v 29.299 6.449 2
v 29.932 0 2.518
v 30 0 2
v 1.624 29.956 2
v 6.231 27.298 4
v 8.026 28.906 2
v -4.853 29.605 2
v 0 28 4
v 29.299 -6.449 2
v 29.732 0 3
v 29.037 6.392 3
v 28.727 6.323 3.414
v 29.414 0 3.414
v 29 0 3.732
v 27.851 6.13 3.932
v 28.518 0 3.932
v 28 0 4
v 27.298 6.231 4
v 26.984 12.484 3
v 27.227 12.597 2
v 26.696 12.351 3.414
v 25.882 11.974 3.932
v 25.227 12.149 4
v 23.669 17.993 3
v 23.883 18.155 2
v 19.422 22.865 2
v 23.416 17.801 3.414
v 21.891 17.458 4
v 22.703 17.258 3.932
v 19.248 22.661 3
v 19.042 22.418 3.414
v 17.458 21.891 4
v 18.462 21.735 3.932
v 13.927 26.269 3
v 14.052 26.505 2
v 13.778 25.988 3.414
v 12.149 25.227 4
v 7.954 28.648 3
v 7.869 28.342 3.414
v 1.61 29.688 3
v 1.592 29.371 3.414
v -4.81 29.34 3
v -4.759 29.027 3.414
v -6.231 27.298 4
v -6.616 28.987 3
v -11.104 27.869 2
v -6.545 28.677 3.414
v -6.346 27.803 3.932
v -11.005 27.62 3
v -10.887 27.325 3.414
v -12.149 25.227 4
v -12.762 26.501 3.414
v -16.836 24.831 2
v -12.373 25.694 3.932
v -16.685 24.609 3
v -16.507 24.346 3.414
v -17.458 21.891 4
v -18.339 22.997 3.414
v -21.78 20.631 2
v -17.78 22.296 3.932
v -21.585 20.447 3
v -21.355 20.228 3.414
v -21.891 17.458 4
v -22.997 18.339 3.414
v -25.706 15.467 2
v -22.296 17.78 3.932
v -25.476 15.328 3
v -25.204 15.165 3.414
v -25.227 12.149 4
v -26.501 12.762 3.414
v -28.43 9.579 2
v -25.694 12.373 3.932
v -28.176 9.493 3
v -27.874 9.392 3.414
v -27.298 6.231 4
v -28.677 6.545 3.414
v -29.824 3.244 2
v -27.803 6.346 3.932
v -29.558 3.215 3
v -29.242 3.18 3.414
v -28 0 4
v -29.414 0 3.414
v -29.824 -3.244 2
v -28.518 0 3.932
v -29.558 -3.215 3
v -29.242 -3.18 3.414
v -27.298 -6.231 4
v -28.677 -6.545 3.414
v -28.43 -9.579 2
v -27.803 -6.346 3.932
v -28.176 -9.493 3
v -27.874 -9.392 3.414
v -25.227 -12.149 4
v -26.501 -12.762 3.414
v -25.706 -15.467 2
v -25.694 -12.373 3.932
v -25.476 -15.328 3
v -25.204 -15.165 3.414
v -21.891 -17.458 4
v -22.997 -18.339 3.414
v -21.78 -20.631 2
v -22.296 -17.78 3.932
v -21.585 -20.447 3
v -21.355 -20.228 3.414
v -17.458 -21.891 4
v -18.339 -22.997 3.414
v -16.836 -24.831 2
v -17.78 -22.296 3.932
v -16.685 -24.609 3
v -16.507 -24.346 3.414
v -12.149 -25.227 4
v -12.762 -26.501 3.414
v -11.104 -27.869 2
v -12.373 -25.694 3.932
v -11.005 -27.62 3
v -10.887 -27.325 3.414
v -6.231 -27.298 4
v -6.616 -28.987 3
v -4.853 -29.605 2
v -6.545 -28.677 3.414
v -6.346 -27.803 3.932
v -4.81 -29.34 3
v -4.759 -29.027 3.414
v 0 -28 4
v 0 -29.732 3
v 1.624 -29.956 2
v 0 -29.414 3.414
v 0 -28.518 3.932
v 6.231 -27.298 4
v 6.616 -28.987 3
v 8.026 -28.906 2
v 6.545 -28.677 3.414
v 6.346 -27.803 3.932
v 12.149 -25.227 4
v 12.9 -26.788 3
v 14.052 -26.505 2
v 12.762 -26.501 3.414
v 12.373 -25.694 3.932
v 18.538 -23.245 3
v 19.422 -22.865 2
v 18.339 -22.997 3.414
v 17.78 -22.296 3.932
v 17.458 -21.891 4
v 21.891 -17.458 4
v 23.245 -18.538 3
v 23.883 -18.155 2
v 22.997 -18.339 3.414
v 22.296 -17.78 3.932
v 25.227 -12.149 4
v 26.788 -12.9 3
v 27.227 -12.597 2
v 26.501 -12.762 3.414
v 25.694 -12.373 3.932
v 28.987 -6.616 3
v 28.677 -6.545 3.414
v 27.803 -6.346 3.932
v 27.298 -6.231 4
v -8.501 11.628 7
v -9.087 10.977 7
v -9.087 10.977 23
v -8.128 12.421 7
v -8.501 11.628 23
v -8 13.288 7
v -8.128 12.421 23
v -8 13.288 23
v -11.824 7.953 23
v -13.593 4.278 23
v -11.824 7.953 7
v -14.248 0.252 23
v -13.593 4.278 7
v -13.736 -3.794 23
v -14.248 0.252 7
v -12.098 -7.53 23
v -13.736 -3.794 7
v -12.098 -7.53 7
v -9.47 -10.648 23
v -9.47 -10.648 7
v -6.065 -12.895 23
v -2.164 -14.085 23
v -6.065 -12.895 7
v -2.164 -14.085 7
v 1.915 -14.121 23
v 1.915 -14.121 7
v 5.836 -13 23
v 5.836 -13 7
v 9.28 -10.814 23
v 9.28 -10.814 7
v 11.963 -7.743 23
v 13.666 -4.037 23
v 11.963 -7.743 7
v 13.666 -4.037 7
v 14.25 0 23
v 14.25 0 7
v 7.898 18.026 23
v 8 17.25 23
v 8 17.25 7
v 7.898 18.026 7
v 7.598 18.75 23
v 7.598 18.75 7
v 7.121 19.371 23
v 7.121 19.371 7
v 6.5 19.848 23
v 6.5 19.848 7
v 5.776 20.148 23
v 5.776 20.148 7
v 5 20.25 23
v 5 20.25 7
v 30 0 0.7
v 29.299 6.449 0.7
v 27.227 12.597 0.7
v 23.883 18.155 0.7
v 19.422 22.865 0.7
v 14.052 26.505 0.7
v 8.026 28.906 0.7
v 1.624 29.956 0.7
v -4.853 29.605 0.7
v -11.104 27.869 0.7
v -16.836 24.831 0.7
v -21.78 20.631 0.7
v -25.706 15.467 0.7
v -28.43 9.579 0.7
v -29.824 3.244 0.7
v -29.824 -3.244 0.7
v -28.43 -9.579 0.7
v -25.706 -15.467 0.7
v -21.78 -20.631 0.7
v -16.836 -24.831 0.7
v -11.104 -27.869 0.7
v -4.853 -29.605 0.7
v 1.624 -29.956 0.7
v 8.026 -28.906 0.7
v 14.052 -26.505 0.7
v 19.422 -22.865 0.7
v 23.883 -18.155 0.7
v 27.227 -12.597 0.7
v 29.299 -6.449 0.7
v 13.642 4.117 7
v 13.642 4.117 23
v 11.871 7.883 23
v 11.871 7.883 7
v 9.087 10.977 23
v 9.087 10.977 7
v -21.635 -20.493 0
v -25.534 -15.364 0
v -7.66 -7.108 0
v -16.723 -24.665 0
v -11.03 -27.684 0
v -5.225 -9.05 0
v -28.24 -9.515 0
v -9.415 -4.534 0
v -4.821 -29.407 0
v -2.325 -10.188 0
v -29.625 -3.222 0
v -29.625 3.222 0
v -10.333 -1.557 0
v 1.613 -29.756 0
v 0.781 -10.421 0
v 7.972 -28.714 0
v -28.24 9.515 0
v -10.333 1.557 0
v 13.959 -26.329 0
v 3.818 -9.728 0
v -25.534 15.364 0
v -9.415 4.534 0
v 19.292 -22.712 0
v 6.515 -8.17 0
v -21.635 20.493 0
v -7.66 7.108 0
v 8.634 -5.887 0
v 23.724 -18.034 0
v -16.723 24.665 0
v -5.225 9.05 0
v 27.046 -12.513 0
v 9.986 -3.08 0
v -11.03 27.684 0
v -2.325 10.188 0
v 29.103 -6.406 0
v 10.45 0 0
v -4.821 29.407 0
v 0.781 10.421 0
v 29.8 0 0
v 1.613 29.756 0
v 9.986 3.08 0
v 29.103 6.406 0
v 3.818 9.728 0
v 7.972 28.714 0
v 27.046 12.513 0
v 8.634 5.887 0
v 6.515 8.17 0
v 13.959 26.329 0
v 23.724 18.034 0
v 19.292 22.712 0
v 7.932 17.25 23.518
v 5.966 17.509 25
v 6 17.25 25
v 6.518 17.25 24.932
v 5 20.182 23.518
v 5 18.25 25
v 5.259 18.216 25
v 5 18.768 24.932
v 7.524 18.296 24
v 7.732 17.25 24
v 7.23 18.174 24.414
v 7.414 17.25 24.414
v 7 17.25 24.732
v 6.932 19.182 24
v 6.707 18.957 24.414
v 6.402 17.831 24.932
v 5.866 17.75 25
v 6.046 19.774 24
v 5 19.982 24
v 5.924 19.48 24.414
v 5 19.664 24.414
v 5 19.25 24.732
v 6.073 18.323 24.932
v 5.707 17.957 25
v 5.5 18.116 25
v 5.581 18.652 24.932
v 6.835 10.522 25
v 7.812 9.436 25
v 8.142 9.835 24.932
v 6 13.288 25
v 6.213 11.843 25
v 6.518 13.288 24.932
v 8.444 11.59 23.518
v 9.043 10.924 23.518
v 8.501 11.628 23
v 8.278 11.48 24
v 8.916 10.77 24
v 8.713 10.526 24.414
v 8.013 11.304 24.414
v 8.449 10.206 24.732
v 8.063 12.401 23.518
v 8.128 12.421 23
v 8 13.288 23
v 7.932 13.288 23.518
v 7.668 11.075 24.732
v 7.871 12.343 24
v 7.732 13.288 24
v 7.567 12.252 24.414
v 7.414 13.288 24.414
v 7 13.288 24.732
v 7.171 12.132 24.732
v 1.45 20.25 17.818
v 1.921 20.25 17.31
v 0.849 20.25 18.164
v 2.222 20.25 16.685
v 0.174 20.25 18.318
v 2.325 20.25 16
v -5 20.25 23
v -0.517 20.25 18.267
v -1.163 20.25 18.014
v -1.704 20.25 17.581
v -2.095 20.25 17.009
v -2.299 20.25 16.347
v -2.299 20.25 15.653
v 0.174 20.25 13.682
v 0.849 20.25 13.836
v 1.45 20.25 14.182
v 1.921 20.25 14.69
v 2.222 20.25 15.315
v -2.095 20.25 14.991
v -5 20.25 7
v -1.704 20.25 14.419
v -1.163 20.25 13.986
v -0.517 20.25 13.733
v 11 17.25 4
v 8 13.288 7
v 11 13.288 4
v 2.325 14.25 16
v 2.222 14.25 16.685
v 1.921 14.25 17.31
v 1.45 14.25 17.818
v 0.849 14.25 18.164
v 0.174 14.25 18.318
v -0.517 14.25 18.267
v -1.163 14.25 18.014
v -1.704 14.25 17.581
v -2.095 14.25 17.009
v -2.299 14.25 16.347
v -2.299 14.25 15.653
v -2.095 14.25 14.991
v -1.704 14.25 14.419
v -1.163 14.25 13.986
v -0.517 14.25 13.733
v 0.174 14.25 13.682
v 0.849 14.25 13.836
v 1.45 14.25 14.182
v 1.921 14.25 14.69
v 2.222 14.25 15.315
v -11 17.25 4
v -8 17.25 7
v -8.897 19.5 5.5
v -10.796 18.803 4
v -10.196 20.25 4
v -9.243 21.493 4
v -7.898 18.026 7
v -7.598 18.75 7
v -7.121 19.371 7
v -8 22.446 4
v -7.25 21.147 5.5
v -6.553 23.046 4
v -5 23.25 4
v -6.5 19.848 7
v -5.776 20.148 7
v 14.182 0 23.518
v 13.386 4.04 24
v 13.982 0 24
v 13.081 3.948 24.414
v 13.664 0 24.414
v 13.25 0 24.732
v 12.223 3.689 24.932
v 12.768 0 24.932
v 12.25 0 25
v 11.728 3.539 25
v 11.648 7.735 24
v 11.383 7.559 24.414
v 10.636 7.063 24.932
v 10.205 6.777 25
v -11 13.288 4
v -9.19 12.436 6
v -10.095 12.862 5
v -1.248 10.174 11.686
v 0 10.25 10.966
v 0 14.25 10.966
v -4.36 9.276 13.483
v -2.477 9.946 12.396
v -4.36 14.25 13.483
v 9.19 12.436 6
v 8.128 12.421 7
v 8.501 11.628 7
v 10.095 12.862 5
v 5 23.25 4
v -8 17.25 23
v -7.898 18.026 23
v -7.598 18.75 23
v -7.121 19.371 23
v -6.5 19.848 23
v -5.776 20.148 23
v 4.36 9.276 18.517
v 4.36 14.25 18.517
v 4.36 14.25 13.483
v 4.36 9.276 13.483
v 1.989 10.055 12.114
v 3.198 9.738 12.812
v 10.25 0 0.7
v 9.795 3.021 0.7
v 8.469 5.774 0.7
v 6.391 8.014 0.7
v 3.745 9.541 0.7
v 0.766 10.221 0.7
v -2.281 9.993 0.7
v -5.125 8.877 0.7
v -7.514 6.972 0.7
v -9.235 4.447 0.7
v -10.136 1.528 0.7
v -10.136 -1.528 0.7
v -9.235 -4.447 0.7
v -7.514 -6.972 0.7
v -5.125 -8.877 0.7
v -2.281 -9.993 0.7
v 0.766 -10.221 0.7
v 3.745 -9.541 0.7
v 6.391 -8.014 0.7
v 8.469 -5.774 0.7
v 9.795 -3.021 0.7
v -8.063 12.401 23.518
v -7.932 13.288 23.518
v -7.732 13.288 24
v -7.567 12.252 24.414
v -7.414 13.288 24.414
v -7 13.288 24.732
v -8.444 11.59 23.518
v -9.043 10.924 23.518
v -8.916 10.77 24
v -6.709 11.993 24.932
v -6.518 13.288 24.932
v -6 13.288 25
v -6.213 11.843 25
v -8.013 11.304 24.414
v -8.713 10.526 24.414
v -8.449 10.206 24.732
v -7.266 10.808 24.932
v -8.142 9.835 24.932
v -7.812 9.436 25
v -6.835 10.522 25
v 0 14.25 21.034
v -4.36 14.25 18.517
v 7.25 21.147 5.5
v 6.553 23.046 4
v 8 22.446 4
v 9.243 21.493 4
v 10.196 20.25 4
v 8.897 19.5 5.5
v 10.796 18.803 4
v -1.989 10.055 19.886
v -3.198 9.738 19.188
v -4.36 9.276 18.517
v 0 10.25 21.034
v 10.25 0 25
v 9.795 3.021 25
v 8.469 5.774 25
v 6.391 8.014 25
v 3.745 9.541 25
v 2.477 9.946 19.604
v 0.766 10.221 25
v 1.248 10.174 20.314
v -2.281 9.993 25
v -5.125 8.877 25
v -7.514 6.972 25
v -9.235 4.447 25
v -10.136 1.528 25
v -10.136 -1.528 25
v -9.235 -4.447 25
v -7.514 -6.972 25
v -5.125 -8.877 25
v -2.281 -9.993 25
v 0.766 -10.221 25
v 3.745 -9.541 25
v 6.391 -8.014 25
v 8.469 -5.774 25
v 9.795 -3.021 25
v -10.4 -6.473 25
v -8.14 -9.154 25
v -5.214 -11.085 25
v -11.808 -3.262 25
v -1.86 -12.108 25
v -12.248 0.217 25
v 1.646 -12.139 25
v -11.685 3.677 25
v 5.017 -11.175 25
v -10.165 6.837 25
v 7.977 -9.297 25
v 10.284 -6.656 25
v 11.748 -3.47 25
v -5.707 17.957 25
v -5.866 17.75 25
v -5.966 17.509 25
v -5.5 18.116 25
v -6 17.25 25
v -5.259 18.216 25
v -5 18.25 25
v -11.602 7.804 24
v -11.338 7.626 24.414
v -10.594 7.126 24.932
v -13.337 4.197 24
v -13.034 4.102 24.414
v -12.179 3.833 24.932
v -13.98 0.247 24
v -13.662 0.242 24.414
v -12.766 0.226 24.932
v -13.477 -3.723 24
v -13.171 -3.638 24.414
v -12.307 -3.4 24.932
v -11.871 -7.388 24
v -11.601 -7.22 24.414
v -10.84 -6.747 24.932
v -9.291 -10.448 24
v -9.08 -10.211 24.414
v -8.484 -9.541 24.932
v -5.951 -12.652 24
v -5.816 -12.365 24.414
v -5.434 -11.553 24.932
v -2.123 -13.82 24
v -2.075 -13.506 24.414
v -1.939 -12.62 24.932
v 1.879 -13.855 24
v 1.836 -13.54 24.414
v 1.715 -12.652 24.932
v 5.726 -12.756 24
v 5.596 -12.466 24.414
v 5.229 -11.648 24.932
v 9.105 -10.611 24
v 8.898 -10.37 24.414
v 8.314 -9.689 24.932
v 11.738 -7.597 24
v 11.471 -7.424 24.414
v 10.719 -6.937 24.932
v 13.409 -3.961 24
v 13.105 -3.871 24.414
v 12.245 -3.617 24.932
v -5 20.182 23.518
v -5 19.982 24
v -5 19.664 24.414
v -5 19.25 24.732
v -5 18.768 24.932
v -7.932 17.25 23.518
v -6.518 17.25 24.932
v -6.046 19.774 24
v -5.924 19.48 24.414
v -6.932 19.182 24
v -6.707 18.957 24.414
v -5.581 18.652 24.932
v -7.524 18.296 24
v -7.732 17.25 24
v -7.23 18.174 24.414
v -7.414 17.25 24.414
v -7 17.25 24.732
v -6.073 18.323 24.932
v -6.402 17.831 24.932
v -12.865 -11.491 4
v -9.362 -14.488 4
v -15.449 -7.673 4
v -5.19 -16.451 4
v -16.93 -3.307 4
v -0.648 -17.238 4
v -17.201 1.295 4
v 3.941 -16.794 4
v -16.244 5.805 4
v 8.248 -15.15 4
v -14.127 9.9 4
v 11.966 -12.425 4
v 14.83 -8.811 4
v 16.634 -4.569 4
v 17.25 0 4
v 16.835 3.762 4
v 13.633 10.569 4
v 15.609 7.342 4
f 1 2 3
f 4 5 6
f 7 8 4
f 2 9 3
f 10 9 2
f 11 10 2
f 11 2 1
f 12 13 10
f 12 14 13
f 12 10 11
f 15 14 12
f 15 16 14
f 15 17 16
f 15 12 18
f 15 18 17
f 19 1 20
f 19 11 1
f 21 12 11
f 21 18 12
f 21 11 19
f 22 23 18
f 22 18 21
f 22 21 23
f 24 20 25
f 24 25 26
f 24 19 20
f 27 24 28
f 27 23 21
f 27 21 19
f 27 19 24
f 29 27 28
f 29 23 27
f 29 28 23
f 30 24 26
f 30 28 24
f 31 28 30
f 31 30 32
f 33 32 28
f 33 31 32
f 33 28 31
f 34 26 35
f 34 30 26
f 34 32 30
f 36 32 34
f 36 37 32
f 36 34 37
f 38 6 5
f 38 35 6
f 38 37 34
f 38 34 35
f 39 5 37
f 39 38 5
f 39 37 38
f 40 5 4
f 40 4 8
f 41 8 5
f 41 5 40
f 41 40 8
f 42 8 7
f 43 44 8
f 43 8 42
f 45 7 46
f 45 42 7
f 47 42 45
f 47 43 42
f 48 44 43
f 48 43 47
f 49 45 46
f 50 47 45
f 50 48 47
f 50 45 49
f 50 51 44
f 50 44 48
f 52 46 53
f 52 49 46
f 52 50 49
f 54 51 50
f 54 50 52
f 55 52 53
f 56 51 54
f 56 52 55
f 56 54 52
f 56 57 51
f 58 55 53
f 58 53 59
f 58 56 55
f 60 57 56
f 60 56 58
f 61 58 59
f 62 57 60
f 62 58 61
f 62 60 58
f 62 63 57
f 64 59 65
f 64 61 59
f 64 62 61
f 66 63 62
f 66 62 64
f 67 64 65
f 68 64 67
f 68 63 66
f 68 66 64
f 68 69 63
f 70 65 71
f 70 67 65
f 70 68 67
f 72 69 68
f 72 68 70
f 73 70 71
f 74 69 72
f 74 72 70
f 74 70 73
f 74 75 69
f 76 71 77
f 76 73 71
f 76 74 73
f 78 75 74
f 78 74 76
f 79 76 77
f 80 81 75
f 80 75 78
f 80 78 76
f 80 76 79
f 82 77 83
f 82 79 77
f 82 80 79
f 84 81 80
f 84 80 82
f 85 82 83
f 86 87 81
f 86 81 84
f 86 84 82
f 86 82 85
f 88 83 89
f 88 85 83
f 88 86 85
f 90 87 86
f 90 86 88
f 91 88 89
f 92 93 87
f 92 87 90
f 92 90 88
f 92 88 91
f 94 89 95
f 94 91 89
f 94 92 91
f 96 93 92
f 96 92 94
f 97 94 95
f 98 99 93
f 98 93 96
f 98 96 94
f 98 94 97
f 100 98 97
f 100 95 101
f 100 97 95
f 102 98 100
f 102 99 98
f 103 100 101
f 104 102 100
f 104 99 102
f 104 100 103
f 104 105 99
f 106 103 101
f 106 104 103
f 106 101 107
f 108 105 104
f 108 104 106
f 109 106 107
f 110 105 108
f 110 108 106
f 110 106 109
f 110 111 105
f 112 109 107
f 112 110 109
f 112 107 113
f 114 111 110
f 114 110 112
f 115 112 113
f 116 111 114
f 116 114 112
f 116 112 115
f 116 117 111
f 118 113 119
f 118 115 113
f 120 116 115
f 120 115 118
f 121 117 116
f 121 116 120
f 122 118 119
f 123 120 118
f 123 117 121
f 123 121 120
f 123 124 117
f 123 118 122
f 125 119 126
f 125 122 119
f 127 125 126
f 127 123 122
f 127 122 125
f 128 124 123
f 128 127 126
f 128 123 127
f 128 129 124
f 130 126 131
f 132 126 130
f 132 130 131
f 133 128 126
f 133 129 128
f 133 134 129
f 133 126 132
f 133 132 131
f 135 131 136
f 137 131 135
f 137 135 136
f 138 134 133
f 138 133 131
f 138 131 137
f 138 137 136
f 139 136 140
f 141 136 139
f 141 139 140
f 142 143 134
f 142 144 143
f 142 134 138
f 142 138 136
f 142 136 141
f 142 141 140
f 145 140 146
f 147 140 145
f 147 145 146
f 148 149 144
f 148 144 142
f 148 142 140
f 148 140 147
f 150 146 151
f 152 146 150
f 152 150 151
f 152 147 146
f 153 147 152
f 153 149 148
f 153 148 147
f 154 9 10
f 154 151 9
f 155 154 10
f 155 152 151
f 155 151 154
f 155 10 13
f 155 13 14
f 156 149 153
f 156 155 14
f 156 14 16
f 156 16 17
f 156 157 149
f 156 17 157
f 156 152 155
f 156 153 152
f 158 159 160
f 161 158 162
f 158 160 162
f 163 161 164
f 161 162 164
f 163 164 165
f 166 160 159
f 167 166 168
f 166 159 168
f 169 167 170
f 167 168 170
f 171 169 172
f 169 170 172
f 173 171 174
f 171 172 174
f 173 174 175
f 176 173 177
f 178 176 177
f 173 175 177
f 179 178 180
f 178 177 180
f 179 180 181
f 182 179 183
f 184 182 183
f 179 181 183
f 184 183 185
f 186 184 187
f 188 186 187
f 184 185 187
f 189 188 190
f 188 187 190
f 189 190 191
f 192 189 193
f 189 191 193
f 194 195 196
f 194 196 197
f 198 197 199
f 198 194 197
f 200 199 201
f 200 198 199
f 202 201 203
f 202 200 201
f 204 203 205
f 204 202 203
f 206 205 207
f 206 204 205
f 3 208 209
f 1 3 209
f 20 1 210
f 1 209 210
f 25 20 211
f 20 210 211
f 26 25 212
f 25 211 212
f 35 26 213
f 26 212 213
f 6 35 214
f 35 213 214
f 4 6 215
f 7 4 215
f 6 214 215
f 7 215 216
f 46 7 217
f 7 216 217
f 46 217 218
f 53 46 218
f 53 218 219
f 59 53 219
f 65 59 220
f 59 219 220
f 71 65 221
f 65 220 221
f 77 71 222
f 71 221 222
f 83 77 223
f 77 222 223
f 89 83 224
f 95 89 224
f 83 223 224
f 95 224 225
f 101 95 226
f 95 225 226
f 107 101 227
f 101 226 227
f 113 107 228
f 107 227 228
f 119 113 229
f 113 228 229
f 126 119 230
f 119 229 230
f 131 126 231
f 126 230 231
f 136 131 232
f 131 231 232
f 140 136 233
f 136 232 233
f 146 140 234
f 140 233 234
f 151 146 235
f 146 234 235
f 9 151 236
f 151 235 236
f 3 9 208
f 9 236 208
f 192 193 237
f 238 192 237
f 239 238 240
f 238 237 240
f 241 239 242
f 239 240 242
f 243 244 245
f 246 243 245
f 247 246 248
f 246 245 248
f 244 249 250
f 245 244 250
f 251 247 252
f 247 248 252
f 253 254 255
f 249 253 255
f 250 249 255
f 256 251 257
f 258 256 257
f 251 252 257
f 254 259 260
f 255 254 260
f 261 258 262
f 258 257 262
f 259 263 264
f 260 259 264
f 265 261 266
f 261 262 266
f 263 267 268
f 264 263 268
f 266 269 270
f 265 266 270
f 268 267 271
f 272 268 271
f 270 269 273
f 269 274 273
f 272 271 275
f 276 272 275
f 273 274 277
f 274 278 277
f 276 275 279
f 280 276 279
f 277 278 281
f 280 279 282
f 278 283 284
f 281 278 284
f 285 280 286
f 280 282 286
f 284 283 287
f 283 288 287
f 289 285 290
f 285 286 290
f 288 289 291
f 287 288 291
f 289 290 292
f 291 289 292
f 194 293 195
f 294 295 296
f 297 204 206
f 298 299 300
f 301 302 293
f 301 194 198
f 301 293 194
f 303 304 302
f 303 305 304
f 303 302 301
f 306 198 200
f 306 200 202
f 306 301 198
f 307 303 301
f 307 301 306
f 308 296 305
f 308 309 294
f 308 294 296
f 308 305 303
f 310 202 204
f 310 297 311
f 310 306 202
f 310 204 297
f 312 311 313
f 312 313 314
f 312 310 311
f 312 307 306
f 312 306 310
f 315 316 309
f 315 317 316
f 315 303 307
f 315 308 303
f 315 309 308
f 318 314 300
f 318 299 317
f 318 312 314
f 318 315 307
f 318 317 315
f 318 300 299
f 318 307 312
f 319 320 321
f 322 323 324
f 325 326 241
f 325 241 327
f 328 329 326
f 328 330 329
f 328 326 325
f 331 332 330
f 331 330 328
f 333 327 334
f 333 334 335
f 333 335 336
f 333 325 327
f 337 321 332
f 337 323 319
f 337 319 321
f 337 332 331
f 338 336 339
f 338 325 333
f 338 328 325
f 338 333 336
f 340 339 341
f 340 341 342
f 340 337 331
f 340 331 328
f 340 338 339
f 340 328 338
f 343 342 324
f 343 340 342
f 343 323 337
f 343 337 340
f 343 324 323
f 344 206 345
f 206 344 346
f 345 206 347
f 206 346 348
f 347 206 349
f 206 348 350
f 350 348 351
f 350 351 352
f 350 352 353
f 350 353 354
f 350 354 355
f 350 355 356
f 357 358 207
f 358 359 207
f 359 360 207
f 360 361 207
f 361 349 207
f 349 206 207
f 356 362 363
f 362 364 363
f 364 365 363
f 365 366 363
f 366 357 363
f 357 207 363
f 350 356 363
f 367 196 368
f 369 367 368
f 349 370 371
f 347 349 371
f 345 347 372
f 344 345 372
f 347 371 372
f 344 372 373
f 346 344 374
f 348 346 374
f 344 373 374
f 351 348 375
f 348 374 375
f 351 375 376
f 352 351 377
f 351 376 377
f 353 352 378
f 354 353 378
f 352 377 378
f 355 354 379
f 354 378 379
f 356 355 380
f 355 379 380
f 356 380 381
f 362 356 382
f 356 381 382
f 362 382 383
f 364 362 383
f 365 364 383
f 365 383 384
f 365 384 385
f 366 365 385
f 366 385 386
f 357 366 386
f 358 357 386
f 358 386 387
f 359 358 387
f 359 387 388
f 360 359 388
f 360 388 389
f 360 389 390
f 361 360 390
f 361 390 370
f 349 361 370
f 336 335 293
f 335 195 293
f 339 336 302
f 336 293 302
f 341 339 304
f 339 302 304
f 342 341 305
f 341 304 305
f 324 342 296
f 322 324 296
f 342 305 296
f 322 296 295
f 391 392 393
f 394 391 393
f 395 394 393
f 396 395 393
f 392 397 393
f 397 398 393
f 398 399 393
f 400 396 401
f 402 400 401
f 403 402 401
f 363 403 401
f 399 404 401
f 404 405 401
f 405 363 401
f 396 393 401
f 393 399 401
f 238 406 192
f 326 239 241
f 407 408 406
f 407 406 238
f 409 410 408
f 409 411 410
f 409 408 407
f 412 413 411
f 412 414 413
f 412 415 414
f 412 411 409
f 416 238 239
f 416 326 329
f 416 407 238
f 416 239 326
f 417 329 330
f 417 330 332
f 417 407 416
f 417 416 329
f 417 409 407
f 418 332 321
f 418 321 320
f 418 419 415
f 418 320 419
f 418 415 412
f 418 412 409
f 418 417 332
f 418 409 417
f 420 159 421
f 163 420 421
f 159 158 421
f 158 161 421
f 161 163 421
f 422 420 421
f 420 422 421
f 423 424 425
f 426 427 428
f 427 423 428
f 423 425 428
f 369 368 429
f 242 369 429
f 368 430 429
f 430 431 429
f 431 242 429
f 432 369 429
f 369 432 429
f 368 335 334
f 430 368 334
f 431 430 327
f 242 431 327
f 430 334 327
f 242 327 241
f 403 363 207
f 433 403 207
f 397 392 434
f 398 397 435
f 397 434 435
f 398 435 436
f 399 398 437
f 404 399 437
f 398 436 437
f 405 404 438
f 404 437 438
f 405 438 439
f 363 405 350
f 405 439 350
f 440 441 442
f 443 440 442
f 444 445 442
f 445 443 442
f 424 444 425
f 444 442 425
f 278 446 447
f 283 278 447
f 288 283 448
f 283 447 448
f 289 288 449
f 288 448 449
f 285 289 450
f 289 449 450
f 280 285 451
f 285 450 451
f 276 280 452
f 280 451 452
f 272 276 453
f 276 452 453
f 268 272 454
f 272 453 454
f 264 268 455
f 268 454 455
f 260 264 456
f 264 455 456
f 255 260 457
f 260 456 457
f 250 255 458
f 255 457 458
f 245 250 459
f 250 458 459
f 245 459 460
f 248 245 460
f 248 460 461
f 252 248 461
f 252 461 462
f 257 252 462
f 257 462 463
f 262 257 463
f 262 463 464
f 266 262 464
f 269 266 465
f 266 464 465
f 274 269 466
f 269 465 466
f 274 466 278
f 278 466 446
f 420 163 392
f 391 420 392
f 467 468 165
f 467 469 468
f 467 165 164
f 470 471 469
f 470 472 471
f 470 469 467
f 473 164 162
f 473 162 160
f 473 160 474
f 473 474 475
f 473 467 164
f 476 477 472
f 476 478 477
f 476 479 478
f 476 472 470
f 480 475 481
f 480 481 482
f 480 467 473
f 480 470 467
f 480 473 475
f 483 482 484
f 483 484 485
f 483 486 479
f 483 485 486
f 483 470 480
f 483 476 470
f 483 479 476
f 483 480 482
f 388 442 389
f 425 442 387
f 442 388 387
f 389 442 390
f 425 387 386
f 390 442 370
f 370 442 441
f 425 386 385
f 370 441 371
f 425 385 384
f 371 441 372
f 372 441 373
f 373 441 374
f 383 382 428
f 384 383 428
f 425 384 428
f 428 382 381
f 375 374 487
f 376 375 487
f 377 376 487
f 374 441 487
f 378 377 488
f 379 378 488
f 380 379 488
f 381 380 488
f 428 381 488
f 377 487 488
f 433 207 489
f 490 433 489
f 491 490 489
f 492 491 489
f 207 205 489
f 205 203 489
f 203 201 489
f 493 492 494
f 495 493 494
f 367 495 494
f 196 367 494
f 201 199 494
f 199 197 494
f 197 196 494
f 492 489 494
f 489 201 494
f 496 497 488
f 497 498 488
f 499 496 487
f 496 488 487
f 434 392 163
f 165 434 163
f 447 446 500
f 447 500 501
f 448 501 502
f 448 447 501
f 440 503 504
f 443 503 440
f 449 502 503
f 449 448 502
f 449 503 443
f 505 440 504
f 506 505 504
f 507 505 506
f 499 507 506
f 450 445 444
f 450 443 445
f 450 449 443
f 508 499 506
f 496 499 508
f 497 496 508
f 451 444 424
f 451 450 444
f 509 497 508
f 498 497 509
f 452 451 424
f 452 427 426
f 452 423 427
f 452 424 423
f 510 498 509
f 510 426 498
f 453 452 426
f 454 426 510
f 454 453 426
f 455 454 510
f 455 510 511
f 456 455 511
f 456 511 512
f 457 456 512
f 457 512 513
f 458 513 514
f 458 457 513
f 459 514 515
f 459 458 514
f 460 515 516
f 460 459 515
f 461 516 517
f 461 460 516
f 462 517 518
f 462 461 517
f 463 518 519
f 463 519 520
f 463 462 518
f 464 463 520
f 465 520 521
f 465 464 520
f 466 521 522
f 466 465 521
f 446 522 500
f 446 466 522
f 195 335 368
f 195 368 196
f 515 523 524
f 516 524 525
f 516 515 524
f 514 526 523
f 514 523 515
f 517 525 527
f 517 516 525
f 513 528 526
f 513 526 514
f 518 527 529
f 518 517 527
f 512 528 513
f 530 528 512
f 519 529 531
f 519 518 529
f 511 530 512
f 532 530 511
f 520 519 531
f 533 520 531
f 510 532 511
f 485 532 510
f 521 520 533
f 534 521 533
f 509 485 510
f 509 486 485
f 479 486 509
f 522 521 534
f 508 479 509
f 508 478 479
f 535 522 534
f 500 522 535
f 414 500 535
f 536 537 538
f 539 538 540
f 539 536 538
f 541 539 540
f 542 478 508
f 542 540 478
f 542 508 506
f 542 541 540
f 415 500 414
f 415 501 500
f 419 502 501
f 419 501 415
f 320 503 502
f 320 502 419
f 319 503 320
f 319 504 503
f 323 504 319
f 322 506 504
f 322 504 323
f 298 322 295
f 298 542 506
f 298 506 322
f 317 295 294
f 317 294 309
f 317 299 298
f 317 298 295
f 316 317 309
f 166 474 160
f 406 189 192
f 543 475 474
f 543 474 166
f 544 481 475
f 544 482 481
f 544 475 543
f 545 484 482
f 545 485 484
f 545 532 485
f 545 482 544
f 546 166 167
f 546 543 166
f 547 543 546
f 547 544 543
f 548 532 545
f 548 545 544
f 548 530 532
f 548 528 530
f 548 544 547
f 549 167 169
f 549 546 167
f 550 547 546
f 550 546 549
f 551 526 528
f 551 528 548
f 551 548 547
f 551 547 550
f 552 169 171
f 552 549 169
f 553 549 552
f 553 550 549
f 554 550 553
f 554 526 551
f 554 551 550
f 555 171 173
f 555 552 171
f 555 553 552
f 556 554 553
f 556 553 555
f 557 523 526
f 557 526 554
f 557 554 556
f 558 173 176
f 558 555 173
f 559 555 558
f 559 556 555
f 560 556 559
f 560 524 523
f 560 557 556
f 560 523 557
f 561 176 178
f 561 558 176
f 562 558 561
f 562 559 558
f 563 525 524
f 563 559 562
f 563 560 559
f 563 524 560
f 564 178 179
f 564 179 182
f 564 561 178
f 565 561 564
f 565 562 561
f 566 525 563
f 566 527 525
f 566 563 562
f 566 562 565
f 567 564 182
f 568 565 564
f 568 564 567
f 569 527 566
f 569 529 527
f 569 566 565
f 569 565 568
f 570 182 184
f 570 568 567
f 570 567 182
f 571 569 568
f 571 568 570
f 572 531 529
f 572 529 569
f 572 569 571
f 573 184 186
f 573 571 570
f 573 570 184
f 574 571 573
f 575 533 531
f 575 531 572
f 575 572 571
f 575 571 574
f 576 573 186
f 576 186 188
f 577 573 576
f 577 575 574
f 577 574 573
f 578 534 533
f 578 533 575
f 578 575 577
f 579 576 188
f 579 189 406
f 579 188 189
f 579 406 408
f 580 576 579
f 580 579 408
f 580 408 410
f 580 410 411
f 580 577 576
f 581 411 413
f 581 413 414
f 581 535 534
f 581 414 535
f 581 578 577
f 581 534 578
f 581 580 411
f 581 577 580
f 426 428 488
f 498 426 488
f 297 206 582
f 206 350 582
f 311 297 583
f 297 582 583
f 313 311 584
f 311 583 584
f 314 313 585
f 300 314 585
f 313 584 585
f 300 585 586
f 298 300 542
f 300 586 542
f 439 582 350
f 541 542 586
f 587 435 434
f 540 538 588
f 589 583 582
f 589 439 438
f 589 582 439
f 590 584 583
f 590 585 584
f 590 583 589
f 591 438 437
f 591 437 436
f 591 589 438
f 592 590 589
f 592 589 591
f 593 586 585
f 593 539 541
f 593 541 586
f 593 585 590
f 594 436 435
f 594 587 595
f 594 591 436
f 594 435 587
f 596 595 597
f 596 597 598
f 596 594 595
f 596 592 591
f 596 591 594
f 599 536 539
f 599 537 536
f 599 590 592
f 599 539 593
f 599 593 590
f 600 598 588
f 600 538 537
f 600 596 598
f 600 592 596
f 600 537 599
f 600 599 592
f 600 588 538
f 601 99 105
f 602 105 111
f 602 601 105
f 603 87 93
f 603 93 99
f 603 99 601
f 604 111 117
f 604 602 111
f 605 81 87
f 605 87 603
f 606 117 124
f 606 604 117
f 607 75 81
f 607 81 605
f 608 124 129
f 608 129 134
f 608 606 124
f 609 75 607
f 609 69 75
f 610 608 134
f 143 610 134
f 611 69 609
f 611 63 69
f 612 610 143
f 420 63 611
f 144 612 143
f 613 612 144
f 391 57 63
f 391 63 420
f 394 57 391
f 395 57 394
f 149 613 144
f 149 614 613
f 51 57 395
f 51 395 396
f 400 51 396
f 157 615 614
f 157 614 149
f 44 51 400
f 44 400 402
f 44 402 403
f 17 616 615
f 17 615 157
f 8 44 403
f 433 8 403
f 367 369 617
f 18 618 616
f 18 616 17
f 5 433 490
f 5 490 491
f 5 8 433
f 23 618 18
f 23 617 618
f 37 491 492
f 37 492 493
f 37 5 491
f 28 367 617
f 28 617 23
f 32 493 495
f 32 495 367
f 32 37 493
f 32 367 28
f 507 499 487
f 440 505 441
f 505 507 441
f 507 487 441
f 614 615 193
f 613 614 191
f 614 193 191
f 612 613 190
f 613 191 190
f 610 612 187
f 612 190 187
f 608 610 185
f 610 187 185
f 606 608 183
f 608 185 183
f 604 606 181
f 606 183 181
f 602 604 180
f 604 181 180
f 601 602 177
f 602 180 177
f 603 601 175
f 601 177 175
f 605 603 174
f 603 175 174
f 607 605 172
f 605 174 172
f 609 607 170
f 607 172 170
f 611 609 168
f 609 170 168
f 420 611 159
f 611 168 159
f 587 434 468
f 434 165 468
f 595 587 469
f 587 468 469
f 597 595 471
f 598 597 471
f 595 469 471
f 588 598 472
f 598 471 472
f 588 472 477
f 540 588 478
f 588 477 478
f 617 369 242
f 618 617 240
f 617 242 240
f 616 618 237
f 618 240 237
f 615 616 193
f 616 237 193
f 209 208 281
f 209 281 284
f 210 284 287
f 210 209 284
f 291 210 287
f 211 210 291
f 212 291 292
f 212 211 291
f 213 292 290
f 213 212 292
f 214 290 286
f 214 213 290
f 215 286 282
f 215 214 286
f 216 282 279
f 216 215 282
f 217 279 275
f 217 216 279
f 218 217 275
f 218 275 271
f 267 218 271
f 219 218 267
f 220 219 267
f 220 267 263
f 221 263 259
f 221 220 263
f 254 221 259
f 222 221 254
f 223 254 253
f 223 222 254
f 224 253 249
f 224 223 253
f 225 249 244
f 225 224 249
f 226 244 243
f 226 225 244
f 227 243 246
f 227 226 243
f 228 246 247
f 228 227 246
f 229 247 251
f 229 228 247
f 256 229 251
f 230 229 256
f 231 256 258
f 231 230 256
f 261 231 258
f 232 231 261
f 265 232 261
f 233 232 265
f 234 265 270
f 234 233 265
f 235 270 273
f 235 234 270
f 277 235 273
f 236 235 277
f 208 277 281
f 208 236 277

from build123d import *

# Parameters (mm, degrees)
F0_R     = 30
F0_R_2   = 10.25
F1_DEPTH = 4
F2_DEPTH = 25
F3_R     = 3
F4_SIZE  = 2.99999
F6_SIZE2 = 0.7
F6_SIZE  = 0.2
F7_START = -6
F7_DEPTH = 19
F8_D     = 4.65
F8_DEPTH = 8
F8_TIP   = 1.3970009392
F9_R     = 2


# Not quite as in the source:
# - a fillet or chamfer is up to 0.001 mm smaller than in the source, because OpenCascade refuses the exact size


with BuildPart() as f1:
    # F0 (on Top) → F1 (new body)
    with BuildSketch(Plane.XY):
        Circle(F0_R)
        with BuildLine():
            ThreePointArc((8, 11.7924764151), (12.5909193469, 6.6731739075), (14.25, 0))
            ThreePointArc((14.25, 0), (-6.6731739075, -12.5909193469), (-8, 11.7924764151))
            Line((-8, 11.7924764151), (-8, 20.25))
            Line((-8, 20.25), (8, 20.25))
            Line((8, 20.25), (8, 11.7924764151))
        make_face(mode=Mode.SUBTRACT)
        with BuildLine():
            ThreePointArc((-8, 11.7924764151), (0, 14.25), (8, 11.7924764151))
            Line((8, 11.7924764151), (8, 20.25))
            Line((8, 20.25), (-8, 20.25))
            Line((-8, 20.25), (-8, 11.7924764151))
        make_face()
        with BuildLine():
            ThreePointArc((-8, 11.7924764151), (-6.6731739075, -12.5909193469), (14.25, 0))
            ThreePointArc((14.25, 0), (12.5909193469, 6.6731739075), (8, 11.7924764151))
            ThreePointArc((8, 11.7924764151), (0, 14.25), (-8, 11.7924764151))
        make_face()
        Circle(F0_R_2, mode=Mode.SUBTRACT)
    extrude(amount=F1_DEPTH)

    # F0 (on Top) → F2 (join)
    with BuildSketch(Plane.XY):
        with BuildLine():
            ThreePointArc((-8, 11.7924764151), (0, 14.25), (8, 11.7924764151))
            Line((8, 11.7924764151), (8, 20.25))
            Line((8, 20.25), (-8, 20.25))
            Line((-8, 20.25), (-8, 11.7924764151))
        make_face()
        with BuildLine():
            ThreePointArc((-8, 11.7924764151), (-6.6731739075, -12.5909193469), (14.25, 0))
            ThreePointArc((14.25, 0), (12.5909193469, 6.6731739075), (8, 11.7924764151))
            ThreePointArc((8, 11.7924764151), (0, 14.25), (-8, 11.7924764151))
        make_face()
        Circle(F0_R_2, mode=Mode.SUBTRACT)
    extrude(amount=F2_DEPTH)

    # F3
    f3_edges = [f1.edges().sort_by_distance(p)[0] for p in [
        (-8, 11.792476, 14.5),
        (8, 11.792476, 14.5),
        (8, 20.25, 14.5),
        (-8, 20.25, 14.5),
    ]]
    fillet(f3_edges, radius=F3_R)

    # F4 (size 3 in the source; OpenCascade refuses exactly that, so slightly less here)
    f4_edges = [f1.edges().sort_by_distance(p)[0] for p in [
        (0, -14.25, 4),
        (-8, 15.268841, 4),
        (8, 15.268841, 4),
    ]]
    chamfer(f4_edges, length=F4_SIZE)

    # F6
    f6_edges = [f1.edges().sort_by_distance(p)[0] for p in [
        (-10.25, 0, 0),
        (-30, 0, 0),
    ]]
    f6_side = f1.faces().sort_by_distance((-29.151472, 0, 0))[0]
    chamfer(f6_edges, length=F6_SIZE, length2=F6_SIZE2, reference=f6_side)

    # F5 (on face) → F7 (cut)
    with BuildSketch(Plane(origin=(0, 20.25, 0), x_dir=(-1, 0, 0), z_dir=(0, 1, 0)).offset(F7_START)):
        Polygon((-4.36, 18.5172471737), (-4.36, 13.4827528263), (0, 10.9655056527), (4.36, 13.4827528263), (4.36, 18.5172471737), (0, 21.0344943473), align=None)
    extrude(amount=-F7_DEPTH, mode=Mode.SUBTRACT)

    # F8
    with Locations(Plane(origin=(0, 20.25, 0), x_dir=(-1, 0, 0), z_dir=(0, 1, 0))):
        with Locations((0, 16)):
            Hole(F8_D / 2, depth=F8_DEPTH)
            with Locations((0, 0, -(F8_DEPTH + F8_TIP / 2))):  # 118° drill point
                Cone(0, F8_D / 2, F8_TIP, mode=Mode.SUBTRACT)

    # F9
    f9_edges = [f1.edges().sort_by_distance(p)[0] for p in [
        (-30, 0, 4),
        (0, -14.25, 25),
    ]]
    fillet(f9_edges, radius=F9_R)


solid = f1.part
